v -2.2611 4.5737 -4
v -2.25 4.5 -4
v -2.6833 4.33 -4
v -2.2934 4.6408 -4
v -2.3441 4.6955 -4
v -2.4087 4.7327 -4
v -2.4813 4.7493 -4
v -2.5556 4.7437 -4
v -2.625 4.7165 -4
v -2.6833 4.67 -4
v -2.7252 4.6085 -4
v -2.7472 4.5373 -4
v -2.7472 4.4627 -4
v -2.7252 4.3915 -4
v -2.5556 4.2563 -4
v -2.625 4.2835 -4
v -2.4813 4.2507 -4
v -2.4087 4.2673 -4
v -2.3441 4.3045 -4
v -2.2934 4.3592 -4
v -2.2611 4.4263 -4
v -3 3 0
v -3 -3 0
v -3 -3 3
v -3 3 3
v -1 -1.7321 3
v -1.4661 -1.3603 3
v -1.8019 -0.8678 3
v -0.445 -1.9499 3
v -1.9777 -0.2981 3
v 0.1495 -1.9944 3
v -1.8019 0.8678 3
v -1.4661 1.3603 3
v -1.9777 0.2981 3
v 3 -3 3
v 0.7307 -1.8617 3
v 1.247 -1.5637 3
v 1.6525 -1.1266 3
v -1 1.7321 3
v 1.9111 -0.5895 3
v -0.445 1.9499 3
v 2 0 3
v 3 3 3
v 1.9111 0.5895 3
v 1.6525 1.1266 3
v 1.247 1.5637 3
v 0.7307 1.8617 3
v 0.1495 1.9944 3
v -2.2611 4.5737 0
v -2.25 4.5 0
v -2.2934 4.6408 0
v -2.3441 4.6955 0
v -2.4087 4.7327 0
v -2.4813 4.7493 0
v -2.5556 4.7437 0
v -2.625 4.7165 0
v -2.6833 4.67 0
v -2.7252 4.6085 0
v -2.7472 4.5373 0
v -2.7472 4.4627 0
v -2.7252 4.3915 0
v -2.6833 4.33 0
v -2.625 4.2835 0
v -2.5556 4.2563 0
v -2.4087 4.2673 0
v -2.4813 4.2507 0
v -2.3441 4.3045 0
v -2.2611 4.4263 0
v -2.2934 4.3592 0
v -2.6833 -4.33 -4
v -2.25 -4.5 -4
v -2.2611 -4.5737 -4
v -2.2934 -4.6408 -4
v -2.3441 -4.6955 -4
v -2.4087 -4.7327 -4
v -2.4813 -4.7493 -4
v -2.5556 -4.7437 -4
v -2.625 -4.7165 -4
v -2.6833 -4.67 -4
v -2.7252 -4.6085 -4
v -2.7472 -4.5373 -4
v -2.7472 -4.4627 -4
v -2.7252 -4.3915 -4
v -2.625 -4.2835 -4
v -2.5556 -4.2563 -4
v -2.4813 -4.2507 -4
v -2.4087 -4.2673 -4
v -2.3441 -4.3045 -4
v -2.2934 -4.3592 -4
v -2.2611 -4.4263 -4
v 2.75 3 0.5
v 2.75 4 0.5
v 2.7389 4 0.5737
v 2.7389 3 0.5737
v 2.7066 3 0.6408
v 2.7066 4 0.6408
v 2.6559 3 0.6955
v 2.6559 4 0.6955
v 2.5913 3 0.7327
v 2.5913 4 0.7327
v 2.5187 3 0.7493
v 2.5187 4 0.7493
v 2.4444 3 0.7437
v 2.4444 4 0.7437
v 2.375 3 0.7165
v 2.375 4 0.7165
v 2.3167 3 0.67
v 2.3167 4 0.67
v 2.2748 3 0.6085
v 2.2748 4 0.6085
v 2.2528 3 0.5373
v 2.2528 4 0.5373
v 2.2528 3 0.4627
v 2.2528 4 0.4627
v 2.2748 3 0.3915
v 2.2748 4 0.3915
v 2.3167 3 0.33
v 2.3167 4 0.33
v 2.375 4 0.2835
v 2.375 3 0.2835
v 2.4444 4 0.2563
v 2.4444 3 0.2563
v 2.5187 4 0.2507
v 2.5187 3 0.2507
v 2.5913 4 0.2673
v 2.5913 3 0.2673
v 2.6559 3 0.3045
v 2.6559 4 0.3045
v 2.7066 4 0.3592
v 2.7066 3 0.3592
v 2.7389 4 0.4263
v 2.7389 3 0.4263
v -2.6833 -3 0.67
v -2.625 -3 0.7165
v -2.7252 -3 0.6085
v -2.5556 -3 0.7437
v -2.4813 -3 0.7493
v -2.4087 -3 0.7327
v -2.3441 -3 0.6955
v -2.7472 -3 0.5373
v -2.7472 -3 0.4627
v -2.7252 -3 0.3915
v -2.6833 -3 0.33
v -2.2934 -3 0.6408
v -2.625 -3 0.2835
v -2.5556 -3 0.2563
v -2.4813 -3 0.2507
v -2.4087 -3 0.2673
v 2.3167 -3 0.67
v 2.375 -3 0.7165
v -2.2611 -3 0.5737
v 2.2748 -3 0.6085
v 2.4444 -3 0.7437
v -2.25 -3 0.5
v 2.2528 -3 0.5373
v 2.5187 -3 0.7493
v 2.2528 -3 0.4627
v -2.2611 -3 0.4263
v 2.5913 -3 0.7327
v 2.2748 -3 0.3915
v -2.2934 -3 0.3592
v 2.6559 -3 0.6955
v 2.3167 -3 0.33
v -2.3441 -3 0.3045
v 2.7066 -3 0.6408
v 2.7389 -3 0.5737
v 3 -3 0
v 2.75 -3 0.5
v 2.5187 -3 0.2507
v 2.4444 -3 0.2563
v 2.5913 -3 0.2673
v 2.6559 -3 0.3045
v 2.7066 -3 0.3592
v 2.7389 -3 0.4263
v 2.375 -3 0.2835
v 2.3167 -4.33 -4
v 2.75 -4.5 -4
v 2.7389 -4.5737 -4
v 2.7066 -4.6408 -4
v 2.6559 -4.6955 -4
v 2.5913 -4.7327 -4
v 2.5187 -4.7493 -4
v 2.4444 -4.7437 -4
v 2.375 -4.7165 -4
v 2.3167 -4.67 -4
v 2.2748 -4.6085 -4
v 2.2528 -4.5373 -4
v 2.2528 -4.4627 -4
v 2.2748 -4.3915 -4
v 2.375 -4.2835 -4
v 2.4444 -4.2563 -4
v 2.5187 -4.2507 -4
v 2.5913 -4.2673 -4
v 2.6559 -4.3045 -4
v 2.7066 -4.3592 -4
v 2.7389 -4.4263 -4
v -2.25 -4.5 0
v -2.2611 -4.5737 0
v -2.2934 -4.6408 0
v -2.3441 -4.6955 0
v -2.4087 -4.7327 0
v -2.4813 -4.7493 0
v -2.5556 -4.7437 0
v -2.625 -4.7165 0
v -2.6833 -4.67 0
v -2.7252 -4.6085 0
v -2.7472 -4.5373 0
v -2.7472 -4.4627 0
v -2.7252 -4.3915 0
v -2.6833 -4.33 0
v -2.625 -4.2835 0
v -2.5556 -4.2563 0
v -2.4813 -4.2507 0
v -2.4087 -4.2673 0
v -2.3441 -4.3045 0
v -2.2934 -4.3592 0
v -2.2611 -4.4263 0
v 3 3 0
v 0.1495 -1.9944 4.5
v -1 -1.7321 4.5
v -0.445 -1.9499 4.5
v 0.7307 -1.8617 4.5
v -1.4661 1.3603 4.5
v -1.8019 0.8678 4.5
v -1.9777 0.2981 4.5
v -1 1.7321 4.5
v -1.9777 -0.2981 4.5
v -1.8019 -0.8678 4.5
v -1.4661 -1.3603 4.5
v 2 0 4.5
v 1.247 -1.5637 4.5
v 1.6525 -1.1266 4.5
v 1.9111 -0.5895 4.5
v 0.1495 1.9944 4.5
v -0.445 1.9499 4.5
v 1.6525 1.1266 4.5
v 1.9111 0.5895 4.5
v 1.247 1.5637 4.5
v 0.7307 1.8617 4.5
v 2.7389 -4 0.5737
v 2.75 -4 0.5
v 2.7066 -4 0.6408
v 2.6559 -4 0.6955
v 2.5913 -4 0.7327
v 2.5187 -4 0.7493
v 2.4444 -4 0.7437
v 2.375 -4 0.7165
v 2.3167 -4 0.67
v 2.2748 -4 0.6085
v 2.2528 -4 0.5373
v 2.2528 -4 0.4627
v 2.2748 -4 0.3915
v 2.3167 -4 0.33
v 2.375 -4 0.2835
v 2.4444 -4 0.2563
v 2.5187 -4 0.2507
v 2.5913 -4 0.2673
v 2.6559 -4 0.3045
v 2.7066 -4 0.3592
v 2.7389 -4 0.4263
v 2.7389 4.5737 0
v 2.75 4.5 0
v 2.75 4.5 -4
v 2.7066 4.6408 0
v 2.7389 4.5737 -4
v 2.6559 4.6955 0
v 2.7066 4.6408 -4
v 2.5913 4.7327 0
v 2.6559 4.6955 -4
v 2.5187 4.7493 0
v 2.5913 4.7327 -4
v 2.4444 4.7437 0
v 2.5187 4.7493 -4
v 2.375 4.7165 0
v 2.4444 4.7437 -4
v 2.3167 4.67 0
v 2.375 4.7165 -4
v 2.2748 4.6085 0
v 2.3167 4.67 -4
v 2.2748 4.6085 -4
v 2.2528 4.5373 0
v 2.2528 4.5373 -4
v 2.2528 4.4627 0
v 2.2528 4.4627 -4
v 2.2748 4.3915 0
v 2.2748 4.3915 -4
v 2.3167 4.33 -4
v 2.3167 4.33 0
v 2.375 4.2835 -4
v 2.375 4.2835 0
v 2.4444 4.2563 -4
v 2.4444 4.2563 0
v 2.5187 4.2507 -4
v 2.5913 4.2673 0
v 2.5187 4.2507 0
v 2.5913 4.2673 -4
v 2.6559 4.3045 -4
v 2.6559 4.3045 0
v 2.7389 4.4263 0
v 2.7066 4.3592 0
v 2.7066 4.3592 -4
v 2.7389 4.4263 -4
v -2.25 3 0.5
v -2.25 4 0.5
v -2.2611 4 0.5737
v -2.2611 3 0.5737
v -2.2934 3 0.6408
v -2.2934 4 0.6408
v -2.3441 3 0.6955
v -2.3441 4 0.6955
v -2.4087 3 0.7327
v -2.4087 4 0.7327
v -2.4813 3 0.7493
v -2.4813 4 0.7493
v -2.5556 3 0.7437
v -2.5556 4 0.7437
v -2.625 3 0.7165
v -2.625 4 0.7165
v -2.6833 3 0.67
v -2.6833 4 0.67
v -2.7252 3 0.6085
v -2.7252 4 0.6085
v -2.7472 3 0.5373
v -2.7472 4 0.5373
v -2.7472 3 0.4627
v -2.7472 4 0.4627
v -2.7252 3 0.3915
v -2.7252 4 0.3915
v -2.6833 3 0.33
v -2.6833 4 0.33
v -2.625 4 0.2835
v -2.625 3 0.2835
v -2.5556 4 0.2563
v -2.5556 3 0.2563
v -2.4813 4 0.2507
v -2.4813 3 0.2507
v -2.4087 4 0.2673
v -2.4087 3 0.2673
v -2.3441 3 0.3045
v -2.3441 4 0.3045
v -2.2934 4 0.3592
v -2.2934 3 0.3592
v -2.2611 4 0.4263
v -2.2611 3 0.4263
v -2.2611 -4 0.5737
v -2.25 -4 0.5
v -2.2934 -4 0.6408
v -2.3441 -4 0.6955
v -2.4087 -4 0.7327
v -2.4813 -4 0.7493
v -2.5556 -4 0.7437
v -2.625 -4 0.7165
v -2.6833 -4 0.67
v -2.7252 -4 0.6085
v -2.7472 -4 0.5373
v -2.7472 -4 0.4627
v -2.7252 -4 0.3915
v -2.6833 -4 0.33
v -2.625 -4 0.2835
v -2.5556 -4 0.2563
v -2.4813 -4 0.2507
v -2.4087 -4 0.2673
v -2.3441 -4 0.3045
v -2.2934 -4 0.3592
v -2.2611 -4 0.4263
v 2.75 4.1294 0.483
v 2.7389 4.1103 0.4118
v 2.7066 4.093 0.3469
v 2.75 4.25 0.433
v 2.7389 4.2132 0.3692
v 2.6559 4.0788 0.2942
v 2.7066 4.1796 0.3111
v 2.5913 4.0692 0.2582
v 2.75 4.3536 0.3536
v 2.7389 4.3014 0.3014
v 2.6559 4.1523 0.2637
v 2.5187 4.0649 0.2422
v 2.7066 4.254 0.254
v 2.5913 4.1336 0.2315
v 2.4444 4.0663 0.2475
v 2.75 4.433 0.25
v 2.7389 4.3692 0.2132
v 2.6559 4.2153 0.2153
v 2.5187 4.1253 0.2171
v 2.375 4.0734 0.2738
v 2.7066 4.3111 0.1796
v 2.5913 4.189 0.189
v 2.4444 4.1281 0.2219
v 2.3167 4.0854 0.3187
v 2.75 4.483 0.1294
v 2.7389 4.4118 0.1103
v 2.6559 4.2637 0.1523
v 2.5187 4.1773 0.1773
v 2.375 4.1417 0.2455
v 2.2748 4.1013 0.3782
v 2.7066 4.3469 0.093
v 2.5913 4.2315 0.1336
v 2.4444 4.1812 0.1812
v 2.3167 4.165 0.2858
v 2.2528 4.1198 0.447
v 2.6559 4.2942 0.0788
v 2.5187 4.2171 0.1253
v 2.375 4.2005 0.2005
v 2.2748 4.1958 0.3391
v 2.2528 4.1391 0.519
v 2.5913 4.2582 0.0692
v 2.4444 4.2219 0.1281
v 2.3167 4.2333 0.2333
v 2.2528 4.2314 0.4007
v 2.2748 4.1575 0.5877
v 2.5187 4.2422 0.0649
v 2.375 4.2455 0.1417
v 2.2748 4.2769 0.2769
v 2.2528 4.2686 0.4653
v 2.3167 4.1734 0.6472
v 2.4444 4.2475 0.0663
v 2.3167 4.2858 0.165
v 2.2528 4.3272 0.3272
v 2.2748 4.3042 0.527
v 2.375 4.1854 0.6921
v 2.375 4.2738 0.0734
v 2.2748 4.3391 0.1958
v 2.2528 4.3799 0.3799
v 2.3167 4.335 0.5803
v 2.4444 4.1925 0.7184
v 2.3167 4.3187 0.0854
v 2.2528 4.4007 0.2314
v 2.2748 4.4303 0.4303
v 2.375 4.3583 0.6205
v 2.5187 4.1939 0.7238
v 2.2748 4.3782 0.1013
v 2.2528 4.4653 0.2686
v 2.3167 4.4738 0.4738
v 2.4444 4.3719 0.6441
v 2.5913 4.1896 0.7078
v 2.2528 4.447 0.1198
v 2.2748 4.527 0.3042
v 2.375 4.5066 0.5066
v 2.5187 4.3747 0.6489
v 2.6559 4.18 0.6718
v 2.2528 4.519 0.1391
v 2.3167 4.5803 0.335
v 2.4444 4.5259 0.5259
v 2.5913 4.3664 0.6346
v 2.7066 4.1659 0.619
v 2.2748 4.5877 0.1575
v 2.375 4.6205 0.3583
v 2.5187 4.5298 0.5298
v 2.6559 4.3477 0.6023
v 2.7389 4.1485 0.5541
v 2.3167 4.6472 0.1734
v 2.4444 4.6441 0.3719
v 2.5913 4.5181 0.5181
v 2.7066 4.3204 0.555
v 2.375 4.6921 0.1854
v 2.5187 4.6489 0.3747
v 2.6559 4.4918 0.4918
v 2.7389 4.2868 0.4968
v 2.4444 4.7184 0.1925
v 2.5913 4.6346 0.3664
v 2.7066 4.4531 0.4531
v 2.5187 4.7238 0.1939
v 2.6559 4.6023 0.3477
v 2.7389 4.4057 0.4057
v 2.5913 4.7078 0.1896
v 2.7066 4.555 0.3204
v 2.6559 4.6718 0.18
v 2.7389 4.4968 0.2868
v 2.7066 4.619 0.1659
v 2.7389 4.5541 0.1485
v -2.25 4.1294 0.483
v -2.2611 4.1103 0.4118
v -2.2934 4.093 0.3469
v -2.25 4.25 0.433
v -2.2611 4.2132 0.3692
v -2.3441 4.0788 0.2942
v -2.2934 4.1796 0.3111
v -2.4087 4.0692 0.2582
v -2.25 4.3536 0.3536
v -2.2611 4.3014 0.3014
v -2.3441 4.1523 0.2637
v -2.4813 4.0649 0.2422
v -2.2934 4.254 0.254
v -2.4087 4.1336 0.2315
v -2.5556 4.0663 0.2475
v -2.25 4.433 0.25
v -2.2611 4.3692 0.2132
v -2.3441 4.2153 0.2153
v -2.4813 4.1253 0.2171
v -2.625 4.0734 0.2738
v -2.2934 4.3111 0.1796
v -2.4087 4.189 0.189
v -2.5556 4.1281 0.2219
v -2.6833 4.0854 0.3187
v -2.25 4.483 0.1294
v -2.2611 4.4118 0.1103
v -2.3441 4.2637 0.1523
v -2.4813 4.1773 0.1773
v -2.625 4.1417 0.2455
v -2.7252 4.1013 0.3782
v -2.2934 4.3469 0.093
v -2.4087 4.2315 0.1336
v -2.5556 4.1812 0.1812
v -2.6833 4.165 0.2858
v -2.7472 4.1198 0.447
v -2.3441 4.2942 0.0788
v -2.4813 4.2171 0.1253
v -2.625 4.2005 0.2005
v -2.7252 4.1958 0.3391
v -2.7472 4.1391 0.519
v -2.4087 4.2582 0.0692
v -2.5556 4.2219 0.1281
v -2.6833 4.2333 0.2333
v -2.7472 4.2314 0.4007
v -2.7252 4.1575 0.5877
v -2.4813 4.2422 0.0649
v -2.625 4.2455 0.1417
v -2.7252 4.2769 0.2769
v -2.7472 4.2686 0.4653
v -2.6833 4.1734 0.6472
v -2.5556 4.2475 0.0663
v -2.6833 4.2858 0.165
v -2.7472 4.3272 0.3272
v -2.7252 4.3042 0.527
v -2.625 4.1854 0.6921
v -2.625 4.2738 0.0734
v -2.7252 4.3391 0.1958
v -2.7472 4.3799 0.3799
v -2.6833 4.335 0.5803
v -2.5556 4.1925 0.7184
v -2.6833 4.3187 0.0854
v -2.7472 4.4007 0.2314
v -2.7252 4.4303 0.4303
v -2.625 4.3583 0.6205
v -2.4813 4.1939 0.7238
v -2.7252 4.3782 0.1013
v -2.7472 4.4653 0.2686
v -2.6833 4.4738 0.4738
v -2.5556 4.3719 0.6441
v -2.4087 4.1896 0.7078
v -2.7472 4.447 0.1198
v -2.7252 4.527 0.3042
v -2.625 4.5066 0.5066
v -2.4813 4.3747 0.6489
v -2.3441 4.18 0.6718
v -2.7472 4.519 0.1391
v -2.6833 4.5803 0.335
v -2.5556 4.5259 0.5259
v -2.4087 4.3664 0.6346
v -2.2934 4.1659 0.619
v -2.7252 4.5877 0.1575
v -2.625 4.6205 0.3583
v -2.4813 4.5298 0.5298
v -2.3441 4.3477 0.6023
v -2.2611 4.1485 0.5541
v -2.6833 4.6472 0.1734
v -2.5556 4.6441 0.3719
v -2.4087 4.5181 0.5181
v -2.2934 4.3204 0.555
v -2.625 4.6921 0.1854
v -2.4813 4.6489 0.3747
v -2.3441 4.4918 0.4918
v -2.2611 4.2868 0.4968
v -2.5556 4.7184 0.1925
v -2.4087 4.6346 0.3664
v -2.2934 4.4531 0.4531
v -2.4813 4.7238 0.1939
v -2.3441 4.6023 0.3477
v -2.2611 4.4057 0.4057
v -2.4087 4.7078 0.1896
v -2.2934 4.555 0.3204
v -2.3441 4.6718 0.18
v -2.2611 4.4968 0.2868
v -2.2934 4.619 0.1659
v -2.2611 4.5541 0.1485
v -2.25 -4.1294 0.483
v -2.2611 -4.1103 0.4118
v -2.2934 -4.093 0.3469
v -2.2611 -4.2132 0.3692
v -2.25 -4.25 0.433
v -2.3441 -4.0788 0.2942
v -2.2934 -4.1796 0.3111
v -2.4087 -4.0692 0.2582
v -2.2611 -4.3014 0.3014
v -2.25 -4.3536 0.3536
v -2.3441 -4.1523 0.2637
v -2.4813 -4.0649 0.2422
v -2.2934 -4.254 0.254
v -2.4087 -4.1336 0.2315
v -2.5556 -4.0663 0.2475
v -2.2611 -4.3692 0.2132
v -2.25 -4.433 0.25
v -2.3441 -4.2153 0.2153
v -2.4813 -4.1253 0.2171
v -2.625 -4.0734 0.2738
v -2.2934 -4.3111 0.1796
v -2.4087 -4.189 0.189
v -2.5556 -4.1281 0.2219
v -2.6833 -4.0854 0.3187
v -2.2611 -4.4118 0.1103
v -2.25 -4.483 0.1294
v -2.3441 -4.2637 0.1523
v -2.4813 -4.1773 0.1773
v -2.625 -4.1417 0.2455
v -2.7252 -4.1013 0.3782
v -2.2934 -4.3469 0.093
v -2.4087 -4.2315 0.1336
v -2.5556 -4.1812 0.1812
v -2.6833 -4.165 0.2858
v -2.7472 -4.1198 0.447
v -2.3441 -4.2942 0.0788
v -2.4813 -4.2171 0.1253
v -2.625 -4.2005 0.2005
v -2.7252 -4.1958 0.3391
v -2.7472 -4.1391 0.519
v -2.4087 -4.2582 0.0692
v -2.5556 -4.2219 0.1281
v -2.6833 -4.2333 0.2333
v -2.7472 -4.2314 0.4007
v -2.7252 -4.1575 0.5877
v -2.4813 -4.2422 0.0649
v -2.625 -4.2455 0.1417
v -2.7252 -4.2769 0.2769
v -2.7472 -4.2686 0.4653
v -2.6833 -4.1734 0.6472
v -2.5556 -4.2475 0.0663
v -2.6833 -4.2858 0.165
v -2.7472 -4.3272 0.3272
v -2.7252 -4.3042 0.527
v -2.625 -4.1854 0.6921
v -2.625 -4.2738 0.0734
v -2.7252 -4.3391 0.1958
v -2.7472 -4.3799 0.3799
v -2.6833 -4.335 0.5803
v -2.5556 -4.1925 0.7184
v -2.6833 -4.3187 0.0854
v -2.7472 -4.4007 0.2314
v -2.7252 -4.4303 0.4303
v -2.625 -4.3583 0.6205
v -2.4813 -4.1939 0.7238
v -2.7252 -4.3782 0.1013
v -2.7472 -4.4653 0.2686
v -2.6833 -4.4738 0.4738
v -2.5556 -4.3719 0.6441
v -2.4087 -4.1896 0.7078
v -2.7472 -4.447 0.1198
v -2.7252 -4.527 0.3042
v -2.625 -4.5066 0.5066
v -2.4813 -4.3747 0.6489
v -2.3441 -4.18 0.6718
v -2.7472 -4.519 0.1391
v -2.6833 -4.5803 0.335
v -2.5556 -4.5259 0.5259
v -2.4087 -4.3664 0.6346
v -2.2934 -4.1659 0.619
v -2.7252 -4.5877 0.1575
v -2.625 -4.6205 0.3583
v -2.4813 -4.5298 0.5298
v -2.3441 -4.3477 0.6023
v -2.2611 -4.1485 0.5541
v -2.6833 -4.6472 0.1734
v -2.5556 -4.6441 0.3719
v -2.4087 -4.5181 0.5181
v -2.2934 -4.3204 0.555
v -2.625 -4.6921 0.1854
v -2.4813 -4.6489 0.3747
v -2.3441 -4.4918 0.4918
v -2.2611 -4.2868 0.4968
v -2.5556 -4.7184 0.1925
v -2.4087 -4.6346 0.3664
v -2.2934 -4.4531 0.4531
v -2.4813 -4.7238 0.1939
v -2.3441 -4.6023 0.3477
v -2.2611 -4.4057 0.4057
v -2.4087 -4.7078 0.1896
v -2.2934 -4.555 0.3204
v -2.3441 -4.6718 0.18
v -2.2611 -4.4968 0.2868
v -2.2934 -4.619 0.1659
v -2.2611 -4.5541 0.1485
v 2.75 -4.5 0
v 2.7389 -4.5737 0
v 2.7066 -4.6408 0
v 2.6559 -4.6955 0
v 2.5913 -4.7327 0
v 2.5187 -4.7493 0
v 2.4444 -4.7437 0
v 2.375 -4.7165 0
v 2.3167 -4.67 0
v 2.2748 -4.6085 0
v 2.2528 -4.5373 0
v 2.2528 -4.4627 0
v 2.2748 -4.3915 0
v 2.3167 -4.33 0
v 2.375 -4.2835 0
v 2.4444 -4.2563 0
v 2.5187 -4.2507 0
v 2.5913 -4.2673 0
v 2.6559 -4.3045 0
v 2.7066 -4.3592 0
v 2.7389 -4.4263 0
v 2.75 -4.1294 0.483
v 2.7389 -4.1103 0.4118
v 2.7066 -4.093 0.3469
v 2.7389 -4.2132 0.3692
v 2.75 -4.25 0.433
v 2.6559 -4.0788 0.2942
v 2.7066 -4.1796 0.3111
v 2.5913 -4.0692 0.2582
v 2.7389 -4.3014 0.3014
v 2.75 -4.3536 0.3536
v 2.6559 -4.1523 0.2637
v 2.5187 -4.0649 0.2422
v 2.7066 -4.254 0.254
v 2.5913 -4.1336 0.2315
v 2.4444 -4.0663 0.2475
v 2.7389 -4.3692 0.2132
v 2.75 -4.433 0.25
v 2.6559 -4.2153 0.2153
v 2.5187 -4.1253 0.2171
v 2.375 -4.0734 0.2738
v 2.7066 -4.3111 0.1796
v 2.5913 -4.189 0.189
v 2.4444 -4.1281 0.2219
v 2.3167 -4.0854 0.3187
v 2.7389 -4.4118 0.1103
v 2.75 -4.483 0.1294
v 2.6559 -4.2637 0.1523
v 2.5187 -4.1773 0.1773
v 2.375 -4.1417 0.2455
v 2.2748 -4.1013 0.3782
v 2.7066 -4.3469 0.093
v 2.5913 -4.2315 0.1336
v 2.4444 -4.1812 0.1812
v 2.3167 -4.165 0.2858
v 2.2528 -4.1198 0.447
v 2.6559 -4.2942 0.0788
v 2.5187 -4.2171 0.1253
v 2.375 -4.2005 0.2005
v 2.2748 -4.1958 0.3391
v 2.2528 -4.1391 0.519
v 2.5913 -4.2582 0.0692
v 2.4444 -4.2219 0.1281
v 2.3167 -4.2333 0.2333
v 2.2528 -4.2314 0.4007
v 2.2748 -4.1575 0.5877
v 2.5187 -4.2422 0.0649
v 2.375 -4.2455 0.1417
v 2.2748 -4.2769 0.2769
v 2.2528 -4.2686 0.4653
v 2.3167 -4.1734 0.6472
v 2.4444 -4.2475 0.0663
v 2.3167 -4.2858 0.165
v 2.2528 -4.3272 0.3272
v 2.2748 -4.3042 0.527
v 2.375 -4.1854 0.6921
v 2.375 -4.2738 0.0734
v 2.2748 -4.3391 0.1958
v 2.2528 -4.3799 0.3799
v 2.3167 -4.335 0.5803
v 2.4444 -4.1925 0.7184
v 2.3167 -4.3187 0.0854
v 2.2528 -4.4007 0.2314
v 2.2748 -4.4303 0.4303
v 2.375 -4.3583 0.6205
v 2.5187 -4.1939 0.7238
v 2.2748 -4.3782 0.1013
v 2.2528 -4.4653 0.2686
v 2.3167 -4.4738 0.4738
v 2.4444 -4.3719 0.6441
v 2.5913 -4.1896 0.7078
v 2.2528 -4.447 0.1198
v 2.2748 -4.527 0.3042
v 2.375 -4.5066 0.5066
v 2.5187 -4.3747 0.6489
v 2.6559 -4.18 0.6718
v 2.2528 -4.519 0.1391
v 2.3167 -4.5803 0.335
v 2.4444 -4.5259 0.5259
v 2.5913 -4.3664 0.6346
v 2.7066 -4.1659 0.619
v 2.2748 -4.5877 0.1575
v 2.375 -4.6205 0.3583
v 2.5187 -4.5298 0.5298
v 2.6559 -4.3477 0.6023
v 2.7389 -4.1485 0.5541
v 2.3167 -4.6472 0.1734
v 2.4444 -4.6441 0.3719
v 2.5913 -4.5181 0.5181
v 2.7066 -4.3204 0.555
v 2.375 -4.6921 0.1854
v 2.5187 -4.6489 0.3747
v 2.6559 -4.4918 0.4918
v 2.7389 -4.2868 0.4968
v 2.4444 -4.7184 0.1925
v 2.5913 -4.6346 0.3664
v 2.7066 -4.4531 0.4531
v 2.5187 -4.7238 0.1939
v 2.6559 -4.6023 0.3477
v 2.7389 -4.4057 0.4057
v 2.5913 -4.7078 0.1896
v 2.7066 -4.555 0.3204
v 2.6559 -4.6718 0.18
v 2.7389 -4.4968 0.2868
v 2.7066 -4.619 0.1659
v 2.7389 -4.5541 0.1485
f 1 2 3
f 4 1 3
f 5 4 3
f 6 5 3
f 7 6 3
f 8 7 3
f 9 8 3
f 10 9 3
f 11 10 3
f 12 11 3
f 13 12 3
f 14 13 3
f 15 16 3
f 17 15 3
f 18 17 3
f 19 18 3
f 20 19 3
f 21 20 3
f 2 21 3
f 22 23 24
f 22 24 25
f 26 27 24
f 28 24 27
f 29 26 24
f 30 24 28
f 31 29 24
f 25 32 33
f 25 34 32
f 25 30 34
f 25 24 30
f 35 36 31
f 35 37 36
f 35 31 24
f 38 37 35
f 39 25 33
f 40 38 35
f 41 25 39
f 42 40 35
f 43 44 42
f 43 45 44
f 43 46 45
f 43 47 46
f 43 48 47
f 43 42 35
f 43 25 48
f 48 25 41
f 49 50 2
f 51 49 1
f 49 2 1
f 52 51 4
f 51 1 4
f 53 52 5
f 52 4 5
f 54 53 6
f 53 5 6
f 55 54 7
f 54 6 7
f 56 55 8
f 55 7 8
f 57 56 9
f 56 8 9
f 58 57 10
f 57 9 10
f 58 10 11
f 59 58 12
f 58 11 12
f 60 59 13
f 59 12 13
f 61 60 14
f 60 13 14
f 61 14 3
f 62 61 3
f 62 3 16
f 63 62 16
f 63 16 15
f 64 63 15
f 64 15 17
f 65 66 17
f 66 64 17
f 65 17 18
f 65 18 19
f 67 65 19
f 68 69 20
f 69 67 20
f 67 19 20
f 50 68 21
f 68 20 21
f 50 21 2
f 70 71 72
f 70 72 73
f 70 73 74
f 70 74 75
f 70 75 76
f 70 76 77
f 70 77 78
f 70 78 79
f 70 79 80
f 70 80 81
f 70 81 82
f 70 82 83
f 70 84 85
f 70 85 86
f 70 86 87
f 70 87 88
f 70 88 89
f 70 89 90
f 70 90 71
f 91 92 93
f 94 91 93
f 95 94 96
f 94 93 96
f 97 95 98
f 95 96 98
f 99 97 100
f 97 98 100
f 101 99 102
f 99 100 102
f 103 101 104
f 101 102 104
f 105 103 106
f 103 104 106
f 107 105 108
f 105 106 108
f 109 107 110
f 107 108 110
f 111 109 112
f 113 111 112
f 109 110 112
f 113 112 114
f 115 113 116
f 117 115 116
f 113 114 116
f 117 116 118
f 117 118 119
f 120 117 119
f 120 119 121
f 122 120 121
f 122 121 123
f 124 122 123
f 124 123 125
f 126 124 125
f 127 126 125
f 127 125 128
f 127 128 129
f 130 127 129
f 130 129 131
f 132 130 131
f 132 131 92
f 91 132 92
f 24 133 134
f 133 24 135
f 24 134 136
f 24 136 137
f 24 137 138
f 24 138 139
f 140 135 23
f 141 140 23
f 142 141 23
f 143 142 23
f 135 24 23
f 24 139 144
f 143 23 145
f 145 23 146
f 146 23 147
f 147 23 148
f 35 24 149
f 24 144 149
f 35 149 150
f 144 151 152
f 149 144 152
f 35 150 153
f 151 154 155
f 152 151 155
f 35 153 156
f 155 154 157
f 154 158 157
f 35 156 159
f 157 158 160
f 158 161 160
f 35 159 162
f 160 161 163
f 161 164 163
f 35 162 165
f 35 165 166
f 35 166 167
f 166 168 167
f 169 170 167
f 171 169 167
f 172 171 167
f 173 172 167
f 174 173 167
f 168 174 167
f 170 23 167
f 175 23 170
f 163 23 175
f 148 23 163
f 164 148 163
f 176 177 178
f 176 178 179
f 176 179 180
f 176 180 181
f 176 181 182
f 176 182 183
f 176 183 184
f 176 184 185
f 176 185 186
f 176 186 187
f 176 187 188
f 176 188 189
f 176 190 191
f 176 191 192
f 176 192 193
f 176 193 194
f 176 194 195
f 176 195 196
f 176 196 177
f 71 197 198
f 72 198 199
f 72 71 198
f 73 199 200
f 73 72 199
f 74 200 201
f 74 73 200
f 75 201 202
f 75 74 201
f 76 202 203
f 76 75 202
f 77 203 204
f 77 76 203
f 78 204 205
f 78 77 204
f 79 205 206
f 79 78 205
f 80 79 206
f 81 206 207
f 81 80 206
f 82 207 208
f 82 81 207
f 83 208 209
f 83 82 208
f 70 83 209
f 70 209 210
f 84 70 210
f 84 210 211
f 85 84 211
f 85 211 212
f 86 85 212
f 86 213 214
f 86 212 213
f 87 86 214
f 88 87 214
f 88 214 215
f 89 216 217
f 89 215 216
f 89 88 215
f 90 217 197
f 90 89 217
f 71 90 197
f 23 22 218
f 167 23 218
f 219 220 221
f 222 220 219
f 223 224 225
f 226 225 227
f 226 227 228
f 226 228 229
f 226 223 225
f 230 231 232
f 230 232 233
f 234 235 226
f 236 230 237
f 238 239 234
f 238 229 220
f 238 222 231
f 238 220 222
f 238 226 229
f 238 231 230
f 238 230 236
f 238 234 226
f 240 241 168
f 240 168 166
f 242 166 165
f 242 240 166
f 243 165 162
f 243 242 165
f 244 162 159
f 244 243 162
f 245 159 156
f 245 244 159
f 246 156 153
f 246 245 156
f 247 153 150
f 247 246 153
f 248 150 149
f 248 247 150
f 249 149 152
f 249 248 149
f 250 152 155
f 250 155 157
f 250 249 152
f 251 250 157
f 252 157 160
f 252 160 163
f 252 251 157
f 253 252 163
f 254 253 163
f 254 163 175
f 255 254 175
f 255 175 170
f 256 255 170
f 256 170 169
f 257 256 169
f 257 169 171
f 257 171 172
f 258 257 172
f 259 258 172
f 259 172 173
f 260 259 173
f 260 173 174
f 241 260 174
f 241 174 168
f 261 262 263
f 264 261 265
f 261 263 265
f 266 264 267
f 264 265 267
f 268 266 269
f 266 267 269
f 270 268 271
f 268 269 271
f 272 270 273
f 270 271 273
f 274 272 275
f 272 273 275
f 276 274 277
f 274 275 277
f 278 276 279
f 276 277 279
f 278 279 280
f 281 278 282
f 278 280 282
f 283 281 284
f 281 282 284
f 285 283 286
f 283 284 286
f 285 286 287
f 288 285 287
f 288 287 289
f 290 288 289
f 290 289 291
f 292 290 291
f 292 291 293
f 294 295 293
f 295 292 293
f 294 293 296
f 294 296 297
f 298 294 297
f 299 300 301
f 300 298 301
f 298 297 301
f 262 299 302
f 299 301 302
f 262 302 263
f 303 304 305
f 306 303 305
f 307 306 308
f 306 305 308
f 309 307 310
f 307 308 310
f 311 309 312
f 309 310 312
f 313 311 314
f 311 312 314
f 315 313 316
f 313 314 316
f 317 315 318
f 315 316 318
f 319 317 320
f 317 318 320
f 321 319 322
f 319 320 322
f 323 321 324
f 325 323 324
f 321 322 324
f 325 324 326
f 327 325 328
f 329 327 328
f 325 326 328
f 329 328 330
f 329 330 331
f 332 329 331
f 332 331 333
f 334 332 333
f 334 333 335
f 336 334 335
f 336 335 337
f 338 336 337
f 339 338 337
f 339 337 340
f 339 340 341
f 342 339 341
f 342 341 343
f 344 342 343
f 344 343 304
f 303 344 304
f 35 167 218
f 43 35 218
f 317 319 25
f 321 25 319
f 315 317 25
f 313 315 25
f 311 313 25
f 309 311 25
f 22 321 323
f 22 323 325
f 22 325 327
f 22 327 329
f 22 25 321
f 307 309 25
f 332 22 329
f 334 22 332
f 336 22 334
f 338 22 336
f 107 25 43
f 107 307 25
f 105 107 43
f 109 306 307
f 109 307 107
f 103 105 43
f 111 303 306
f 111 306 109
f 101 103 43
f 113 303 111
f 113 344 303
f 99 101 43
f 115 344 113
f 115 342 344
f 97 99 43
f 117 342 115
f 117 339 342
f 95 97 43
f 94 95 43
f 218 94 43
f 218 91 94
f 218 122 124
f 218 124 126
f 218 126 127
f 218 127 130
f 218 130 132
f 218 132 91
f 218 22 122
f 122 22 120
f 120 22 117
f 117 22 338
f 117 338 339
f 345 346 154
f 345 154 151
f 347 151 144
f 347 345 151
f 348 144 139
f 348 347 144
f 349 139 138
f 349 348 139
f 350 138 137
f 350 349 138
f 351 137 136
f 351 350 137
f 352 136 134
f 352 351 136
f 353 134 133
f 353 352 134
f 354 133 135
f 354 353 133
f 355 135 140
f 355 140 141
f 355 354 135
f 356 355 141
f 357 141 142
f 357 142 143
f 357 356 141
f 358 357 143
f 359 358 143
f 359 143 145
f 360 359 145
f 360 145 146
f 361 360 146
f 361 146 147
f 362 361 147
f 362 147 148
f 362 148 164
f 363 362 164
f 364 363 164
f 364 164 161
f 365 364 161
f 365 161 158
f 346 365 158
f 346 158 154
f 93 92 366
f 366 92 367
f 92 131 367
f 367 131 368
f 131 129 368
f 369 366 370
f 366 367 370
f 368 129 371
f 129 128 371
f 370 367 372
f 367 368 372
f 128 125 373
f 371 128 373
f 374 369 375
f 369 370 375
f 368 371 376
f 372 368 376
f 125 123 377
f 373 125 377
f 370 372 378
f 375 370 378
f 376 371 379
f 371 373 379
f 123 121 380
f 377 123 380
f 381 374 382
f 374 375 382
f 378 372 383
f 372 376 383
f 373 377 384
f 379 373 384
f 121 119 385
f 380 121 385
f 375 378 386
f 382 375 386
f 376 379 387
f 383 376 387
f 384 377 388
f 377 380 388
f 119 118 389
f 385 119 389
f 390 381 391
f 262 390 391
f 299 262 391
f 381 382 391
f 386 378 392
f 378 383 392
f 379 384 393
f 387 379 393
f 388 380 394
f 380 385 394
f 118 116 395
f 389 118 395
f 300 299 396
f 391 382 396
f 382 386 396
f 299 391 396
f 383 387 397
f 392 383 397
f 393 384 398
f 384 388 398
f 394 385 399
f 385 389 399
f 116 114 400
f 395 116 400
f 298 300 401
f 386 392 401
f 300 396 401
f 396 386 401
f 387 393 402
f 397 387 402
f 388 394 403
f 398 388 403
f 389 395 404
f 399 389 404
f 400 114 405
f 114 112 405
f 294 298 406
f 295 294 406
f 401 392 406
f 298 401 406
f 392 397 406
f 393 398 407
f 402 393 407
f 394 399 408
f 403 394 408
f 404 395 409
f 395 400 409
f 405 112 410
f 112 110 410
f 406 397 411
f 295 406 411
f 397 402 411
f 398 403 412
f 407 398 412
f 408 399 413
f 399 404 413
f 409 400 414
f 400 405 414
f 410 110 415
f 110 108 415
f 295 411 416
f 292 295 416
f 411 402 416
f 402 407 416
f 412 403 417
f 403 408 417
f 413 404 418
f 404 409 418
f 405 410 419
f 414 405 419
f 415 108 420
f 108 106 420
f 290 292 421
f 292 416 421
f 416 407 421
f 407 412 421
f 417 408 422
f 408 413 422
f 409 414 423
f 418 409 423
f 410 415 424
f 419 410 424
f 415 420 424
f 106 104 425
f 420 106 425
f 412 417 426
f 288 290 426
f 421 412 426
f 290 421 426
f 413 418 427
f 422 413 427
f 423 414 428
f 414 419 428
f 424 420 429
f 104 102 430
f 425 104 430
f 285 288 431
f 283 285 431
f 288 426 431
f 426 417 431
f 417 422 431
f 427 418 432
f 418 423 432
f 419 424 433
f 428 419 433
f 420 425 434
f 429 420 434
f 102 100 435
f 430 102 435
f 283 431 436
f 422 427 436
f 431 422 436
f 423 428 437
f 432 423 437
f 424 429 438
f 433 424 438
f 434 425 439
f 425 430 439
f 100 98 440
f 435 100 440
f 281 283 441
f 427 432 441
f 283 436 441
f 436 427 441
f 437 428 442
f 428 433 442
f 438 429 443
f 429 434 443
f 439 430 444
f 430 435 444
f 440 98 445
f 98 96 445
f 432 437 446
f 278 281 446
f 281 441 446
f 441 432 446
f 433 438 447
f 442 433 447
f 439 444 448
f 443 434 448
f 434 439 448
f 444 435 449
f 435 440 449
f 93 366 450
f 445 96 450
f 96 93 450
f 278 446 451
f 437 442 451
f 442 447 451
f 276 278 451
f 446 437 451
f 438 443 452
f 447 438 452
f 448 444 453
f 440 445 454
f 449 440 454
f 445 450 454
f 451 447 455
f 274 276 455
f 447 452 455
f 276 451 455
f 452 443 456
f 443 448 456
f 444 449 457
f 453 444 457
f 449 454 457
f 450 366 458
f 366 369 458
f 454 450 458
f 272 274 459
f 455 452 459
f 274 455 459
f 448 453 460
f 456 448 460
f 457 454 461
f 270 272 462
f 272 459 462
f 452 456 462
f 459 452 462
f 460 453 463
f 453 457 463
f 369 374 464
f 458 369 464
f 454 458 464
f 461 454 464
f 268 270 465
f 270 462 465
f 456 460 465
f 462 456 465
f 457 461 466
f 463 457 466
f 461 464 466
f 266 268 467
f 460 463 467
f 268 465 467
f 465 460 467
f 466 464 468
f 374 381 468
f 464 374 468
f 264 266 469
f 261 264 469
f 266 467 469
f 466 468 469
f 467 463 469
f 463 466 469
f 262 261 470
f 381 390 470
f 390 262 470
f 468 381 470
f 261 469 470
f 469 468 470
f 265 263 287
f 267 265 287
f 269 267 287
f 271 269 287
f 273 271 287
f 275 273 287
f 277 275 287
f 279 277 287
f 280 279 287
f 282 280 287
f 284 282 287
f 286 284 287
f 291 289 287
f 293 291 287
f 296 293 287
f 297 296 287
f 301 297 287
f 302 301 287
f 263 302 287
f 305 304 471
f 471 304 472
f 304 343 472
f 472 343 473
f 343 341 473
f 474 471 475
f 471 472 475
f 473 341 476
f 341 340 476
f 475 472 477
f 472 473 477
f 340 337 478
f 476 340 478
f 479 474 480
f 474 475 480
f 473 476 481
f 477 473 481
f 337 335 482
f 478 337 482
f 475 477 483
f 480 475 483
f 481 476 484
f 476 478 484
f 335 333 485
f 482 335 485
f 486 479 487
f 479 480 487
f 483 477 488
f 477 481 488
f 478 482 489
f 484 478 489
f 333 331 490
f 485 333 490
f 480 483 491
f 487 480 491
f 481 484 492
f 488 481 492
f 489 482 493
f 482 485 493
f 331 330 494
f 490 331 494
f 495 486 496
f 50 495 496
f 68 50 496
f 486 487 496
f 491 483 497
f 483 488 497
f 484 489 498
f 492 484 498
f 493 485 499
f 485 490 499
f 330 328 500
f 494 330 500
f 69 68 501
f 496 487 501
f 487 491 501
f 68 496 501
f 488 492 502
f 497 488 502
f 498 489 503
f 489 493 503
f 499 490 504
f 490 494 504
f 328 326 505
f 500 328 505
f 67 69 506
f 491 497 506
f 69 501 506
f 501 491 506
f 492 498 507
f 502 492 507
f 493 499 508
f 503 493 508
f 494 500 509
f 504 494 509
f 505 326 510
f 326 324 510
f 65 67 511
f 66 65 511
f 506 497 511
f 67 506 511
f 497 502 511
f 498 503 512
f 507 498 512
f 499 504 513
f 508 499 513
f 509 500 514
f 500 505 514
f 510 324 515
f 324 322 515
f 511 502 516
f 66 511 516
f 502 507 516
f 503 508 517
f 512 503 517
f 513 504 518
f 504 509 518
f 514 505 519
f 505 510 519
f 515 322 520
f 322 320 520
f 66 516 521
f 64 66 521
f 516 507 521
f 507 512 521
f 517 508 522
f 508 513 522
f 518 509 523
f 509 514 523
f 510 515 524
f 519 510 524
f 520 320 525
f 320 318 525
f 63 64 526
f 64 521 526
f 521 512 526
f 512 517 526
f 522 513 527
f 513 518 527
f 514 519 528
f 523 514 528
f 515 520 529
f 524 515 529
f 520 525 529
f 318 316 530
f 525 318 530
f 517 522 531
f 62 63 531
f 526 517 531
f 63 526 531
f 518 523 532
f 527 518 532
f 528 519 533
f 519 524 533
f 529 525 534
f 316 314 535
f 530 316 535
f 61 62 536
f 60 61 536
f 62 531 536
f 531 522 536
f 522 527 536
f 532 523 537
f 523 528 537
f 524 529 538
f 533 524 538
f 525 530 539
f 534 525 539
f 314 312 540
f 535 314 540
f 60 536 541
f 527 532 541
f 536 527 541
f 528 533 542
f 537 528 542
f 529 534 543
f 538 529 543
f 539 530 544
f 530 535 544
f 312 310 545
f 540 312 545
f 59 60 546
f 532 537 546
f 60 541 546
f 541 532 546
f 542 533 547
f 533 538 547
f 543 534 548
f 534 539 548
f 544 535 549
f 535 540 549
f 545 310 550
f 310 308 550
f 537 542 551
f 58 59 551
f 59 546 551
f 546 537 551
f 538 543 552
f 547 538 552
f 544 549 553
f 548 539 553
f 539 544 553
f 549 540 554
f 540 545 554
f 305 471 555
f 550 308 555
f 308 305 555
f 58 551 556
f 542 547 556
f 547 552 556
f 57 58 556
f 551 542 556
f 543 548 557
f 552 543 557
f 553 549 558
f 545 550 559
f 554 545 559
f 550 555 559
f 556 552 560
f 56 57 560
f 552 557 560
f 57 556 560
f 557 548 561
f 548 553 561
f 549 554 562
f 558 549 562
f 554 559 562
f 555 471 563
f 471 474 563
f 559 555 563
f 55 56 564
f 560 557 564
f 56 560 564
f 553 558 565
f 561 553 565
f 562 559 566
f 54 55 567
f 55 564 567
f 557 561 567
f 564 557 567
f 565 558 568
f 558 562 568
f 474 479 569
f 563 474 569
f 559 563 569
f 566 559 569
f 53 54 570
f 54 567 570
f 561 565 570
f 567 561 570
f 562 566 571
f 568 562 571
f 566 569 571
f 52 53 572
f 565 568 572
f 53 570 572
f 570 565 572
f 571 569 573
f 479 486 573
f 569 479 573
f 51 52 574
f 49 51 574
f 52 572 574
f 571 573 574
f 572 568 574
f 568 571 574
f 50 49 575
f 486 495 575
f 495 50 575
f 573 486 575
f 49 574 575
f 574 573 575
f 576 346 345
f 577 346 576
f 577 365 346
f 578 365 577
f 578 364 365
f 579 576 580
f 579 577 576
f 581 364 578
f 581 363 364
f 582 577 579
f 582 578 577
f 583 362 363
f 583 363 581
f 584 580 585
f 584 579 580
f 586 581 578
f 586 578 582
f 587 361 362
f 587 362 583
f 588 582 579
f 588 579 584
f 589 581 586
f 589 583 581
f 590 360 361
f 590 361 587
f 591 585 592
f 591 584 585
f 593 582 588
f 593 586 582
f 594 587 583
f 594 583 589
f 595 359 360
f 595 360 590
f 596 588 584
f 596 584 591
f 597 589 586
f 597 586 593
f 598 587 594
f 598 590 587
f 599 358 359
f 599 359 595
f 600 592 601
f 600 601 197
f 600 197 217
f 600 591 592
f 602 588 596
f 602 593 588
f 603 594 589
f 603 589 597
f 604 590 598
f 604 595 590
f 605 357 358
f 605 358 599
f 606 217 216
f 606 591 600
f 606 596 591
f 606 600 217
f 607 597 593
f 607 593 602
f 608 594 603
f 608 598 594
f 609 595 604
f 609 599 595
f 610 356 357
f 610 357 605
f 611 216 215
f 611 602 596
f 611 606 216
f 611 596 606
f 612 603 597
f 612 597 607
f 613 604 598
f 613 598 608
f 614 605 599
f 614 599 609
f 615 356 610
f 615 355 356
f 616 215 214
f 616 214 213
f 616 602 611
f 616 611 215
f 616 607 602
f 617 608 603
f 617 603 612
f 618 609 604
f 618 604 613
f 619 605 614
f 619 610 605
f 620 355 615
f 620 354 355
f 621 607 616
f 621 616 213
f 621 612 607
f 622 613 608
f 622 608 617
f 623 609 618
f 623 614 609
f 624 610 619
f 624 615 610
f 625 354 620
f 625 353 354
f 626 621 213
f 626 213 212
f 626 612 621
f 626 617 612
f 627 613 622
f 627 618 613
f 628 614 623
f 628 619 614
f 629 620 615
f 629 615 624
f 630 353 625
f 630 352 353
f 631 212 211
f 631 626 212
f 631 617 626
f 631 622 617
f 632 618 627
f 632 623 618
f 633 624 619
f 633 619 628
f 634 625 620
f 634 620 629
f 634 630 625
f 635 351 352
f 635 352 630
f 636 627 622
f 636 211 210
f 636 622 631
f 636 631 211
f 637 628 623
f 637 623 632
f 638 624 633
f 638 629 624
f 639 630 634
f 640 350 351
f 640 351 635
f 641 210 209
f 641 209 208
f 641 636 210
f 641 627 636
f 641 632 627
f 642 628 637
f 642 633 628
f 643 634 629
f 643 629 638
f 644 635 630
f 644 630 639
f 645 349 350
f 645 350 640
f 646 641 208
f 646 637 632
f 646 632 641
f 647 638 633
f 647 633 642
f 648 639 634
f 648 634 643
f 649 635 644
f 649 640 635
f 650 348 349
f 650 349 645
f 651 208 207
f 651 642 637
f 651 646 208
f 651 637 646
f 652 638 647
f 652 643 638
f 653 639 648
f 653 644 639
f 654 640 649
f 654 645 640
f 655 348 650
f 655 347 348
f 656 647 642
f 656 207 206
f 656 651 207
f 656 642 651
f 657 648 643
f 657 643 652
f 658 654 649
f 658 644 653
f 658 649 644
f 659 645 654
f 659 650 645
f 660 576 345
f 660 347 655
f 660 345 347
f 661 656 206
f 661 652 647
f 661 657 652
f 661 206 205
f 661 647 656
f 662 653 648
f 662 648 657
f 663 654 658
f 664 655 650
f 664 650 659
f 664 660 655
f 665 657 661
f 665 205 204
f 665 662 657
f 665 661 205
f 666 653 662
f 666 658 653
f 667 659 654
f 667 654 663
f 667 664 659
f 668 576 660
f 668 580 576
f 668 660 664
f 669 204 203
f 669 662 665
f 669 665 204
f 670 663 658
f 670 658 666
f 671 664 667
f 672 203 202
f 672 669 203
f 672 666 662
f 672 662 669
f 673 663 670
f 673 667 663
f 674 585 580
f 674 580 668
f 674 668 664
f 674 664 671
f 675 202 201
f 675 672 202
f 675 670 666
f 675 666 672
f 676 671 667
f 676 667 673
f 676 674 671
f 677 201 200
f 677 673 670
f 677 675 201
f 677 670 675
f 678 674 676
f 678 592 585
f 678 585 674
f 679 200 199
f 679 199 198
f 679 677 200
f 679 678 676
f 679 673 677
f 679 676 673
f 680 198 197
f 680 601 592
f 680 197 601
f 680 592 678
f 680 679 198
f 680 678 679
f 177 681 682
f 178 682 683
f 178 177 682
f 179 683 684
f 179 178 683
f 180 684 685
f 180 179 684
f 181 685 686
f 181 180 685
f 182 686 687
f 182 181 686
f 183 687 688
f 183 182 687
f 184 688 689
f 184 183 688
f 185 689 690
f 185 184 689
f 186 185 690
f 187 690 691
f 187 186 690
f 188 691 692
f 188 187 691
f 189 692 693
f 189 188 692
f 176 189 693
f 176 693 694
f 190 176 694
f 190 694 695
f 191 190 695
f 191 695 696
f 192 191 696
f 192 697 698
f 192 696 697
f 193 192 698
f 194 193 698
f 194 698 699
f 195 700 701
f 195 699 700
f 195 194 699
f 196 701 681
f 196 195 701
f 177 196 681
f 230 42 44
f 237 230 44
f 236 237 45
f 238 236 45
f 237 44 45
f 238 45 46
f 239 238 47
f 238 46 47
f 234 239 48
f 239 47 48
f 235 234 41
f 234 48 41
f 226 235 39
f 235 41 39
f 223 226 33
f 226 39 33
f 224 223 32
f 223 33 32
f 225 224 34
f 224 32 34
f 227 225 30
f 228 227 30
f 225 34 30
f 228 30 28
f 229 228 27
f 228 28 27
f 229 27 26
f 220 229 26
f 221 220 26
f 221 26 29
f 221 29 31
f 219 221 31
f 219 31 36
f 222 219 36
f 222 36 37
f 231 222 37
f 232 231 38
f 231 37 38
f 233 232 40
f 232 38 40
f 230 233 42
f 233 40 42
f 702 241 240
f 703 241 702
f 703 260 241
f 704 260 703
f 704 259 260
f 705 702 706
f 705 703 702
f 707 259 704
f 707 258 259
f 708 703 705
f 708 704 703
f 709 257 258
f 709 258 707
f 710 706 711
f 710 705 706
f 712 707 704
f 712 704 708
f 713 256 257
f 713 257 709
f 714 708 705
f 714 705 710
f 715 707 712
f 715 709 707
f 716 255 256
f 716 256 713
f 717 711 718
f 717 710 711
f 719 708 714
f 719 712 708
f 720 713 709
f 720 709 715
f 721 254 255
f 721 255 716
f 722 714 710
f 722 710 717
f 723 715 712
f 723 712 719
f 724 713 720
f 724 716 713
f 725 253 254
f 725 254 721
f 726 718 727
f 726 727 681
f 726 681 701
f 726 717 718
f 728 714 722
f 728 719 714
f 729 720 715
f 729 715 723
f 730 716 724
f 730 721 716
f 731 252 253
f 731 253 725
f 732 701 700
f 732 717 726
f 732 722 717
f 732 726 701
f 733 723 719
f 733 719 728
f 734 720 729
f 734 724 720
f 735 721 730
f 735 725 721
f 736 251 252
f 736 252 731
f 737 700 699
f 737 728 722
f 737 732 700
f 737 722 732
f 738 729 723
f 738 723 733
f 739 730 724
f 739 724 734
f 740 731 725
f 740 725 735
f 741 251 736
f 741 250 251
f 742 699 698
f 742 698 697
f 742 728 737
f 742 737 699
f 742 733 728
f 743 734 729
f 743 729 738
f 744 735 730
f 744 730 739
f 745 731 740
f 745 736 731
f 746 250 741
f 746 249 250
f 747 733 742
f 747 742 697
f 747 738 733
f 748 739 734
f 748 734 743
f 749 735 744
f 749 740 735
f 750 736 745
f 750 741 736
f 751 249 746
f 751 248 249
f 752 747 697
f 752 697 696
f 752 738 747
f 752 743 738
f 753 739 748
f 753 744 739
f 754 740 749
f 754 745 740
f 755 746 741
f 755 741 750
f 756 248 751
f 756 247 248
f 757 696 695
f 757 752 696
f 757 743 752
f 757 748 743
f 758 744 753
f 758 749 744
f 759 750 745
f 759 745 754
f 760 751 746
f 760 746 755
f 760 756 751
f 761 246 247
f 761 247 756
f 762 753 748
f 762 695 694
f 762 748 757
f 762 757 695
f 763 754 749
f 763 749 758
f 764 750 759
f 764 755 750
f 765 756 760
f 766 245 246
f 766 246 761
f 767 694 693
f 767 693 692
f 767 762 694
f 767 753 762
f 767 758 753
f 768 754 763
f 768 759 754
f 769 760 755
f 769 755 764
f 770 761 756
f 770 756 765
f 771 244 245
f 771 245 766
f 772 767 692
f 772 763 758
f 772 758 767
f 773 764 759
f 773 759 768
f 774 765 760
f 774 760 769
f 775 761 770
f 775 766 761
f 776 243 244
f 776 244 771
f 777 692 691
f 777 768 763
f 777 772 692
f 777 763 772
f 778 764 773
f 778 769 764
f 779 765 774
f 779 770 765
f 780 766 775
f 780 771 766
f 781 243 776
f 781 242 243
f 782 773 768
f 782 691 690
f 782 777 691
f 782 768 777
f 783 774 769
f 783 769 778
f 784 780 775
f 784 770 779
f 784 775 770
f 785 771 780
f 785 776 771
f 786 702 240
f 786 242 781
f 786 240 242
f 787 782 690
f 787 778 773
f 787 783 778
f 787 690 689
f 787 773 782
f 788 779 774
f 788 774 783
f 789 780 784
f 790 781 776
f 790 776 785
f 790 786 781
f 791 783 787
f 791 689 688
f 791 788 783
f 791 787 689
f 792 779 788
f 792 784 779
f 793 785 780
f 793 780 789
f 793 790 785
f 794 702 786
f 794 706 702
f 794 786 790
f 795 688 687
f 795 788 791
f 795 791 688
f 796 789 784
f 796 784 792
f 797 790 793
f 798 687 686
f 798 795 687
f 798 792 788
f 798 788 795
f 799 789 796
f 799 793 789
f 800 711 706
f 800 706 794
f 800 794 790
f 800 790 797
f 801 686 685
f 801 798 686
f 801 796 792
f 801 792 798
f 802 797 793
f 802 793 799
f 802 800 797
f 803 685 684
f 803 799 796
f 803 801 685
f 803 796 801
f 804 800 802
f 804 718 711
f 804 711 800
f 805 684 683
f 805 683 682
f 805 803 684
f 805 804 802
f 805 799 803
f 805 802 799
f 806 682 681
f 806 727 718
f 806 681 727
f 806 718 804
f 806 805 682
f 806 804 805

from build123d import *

# Parameters (mm, degrees)
F0_W     = 6
F0_H     = 6
F1_DEPTH = 3
F2_R     = 2
F3_DEPTH = 1.5
F4_R     = 0.25


# Not quite as in the source:
# - a pattern or mirror of a feature is missing from the dataset's text; its kind, count and spacing are read off the source's solid


with BuildPart() as f1:
    # F0 (on Top) → F1 (new body)
    with BuildSketch(Plane.XY):
        Rectangle(F0_W, F0_H)
    extrude(amount=F1_DEPTH)

    # F2 (on face) → F3 (join)
    with BuildSketch(Plane.XY.offset(3)):
        Circle(F2_R)
    extrude(amount=F3_DEPTH)

    # F6: sweep along a path in F5
    with BuildLine(Plane(origin=(-3, 0, 0), x_dir=(0, -1, 0), z_dir=(-1, 0, 0))) as f6_path:
        Line((3, 0.7), (4, 0.7))
        ThreePointArc((4, 0.7), (4.4949747468, 0.4949747468), (4.7, 0))
        Line((4.7, 0), (4.7, -4))
    # F4 (on face) → F6 (sweep)
    with BuildSketch(Plane.XZ.offset(3)):
        with Locations((-2.5, 0.5)):
            Circle(F4_R)
        with Locations((2.5, 0.5)):
            Circle(F4_R)
    f6 = sweep(path=f6_path.line)

    # F6_copies: F6 across plane
    add(f6.mirror(Plane.ZX))


solid = f1.part
